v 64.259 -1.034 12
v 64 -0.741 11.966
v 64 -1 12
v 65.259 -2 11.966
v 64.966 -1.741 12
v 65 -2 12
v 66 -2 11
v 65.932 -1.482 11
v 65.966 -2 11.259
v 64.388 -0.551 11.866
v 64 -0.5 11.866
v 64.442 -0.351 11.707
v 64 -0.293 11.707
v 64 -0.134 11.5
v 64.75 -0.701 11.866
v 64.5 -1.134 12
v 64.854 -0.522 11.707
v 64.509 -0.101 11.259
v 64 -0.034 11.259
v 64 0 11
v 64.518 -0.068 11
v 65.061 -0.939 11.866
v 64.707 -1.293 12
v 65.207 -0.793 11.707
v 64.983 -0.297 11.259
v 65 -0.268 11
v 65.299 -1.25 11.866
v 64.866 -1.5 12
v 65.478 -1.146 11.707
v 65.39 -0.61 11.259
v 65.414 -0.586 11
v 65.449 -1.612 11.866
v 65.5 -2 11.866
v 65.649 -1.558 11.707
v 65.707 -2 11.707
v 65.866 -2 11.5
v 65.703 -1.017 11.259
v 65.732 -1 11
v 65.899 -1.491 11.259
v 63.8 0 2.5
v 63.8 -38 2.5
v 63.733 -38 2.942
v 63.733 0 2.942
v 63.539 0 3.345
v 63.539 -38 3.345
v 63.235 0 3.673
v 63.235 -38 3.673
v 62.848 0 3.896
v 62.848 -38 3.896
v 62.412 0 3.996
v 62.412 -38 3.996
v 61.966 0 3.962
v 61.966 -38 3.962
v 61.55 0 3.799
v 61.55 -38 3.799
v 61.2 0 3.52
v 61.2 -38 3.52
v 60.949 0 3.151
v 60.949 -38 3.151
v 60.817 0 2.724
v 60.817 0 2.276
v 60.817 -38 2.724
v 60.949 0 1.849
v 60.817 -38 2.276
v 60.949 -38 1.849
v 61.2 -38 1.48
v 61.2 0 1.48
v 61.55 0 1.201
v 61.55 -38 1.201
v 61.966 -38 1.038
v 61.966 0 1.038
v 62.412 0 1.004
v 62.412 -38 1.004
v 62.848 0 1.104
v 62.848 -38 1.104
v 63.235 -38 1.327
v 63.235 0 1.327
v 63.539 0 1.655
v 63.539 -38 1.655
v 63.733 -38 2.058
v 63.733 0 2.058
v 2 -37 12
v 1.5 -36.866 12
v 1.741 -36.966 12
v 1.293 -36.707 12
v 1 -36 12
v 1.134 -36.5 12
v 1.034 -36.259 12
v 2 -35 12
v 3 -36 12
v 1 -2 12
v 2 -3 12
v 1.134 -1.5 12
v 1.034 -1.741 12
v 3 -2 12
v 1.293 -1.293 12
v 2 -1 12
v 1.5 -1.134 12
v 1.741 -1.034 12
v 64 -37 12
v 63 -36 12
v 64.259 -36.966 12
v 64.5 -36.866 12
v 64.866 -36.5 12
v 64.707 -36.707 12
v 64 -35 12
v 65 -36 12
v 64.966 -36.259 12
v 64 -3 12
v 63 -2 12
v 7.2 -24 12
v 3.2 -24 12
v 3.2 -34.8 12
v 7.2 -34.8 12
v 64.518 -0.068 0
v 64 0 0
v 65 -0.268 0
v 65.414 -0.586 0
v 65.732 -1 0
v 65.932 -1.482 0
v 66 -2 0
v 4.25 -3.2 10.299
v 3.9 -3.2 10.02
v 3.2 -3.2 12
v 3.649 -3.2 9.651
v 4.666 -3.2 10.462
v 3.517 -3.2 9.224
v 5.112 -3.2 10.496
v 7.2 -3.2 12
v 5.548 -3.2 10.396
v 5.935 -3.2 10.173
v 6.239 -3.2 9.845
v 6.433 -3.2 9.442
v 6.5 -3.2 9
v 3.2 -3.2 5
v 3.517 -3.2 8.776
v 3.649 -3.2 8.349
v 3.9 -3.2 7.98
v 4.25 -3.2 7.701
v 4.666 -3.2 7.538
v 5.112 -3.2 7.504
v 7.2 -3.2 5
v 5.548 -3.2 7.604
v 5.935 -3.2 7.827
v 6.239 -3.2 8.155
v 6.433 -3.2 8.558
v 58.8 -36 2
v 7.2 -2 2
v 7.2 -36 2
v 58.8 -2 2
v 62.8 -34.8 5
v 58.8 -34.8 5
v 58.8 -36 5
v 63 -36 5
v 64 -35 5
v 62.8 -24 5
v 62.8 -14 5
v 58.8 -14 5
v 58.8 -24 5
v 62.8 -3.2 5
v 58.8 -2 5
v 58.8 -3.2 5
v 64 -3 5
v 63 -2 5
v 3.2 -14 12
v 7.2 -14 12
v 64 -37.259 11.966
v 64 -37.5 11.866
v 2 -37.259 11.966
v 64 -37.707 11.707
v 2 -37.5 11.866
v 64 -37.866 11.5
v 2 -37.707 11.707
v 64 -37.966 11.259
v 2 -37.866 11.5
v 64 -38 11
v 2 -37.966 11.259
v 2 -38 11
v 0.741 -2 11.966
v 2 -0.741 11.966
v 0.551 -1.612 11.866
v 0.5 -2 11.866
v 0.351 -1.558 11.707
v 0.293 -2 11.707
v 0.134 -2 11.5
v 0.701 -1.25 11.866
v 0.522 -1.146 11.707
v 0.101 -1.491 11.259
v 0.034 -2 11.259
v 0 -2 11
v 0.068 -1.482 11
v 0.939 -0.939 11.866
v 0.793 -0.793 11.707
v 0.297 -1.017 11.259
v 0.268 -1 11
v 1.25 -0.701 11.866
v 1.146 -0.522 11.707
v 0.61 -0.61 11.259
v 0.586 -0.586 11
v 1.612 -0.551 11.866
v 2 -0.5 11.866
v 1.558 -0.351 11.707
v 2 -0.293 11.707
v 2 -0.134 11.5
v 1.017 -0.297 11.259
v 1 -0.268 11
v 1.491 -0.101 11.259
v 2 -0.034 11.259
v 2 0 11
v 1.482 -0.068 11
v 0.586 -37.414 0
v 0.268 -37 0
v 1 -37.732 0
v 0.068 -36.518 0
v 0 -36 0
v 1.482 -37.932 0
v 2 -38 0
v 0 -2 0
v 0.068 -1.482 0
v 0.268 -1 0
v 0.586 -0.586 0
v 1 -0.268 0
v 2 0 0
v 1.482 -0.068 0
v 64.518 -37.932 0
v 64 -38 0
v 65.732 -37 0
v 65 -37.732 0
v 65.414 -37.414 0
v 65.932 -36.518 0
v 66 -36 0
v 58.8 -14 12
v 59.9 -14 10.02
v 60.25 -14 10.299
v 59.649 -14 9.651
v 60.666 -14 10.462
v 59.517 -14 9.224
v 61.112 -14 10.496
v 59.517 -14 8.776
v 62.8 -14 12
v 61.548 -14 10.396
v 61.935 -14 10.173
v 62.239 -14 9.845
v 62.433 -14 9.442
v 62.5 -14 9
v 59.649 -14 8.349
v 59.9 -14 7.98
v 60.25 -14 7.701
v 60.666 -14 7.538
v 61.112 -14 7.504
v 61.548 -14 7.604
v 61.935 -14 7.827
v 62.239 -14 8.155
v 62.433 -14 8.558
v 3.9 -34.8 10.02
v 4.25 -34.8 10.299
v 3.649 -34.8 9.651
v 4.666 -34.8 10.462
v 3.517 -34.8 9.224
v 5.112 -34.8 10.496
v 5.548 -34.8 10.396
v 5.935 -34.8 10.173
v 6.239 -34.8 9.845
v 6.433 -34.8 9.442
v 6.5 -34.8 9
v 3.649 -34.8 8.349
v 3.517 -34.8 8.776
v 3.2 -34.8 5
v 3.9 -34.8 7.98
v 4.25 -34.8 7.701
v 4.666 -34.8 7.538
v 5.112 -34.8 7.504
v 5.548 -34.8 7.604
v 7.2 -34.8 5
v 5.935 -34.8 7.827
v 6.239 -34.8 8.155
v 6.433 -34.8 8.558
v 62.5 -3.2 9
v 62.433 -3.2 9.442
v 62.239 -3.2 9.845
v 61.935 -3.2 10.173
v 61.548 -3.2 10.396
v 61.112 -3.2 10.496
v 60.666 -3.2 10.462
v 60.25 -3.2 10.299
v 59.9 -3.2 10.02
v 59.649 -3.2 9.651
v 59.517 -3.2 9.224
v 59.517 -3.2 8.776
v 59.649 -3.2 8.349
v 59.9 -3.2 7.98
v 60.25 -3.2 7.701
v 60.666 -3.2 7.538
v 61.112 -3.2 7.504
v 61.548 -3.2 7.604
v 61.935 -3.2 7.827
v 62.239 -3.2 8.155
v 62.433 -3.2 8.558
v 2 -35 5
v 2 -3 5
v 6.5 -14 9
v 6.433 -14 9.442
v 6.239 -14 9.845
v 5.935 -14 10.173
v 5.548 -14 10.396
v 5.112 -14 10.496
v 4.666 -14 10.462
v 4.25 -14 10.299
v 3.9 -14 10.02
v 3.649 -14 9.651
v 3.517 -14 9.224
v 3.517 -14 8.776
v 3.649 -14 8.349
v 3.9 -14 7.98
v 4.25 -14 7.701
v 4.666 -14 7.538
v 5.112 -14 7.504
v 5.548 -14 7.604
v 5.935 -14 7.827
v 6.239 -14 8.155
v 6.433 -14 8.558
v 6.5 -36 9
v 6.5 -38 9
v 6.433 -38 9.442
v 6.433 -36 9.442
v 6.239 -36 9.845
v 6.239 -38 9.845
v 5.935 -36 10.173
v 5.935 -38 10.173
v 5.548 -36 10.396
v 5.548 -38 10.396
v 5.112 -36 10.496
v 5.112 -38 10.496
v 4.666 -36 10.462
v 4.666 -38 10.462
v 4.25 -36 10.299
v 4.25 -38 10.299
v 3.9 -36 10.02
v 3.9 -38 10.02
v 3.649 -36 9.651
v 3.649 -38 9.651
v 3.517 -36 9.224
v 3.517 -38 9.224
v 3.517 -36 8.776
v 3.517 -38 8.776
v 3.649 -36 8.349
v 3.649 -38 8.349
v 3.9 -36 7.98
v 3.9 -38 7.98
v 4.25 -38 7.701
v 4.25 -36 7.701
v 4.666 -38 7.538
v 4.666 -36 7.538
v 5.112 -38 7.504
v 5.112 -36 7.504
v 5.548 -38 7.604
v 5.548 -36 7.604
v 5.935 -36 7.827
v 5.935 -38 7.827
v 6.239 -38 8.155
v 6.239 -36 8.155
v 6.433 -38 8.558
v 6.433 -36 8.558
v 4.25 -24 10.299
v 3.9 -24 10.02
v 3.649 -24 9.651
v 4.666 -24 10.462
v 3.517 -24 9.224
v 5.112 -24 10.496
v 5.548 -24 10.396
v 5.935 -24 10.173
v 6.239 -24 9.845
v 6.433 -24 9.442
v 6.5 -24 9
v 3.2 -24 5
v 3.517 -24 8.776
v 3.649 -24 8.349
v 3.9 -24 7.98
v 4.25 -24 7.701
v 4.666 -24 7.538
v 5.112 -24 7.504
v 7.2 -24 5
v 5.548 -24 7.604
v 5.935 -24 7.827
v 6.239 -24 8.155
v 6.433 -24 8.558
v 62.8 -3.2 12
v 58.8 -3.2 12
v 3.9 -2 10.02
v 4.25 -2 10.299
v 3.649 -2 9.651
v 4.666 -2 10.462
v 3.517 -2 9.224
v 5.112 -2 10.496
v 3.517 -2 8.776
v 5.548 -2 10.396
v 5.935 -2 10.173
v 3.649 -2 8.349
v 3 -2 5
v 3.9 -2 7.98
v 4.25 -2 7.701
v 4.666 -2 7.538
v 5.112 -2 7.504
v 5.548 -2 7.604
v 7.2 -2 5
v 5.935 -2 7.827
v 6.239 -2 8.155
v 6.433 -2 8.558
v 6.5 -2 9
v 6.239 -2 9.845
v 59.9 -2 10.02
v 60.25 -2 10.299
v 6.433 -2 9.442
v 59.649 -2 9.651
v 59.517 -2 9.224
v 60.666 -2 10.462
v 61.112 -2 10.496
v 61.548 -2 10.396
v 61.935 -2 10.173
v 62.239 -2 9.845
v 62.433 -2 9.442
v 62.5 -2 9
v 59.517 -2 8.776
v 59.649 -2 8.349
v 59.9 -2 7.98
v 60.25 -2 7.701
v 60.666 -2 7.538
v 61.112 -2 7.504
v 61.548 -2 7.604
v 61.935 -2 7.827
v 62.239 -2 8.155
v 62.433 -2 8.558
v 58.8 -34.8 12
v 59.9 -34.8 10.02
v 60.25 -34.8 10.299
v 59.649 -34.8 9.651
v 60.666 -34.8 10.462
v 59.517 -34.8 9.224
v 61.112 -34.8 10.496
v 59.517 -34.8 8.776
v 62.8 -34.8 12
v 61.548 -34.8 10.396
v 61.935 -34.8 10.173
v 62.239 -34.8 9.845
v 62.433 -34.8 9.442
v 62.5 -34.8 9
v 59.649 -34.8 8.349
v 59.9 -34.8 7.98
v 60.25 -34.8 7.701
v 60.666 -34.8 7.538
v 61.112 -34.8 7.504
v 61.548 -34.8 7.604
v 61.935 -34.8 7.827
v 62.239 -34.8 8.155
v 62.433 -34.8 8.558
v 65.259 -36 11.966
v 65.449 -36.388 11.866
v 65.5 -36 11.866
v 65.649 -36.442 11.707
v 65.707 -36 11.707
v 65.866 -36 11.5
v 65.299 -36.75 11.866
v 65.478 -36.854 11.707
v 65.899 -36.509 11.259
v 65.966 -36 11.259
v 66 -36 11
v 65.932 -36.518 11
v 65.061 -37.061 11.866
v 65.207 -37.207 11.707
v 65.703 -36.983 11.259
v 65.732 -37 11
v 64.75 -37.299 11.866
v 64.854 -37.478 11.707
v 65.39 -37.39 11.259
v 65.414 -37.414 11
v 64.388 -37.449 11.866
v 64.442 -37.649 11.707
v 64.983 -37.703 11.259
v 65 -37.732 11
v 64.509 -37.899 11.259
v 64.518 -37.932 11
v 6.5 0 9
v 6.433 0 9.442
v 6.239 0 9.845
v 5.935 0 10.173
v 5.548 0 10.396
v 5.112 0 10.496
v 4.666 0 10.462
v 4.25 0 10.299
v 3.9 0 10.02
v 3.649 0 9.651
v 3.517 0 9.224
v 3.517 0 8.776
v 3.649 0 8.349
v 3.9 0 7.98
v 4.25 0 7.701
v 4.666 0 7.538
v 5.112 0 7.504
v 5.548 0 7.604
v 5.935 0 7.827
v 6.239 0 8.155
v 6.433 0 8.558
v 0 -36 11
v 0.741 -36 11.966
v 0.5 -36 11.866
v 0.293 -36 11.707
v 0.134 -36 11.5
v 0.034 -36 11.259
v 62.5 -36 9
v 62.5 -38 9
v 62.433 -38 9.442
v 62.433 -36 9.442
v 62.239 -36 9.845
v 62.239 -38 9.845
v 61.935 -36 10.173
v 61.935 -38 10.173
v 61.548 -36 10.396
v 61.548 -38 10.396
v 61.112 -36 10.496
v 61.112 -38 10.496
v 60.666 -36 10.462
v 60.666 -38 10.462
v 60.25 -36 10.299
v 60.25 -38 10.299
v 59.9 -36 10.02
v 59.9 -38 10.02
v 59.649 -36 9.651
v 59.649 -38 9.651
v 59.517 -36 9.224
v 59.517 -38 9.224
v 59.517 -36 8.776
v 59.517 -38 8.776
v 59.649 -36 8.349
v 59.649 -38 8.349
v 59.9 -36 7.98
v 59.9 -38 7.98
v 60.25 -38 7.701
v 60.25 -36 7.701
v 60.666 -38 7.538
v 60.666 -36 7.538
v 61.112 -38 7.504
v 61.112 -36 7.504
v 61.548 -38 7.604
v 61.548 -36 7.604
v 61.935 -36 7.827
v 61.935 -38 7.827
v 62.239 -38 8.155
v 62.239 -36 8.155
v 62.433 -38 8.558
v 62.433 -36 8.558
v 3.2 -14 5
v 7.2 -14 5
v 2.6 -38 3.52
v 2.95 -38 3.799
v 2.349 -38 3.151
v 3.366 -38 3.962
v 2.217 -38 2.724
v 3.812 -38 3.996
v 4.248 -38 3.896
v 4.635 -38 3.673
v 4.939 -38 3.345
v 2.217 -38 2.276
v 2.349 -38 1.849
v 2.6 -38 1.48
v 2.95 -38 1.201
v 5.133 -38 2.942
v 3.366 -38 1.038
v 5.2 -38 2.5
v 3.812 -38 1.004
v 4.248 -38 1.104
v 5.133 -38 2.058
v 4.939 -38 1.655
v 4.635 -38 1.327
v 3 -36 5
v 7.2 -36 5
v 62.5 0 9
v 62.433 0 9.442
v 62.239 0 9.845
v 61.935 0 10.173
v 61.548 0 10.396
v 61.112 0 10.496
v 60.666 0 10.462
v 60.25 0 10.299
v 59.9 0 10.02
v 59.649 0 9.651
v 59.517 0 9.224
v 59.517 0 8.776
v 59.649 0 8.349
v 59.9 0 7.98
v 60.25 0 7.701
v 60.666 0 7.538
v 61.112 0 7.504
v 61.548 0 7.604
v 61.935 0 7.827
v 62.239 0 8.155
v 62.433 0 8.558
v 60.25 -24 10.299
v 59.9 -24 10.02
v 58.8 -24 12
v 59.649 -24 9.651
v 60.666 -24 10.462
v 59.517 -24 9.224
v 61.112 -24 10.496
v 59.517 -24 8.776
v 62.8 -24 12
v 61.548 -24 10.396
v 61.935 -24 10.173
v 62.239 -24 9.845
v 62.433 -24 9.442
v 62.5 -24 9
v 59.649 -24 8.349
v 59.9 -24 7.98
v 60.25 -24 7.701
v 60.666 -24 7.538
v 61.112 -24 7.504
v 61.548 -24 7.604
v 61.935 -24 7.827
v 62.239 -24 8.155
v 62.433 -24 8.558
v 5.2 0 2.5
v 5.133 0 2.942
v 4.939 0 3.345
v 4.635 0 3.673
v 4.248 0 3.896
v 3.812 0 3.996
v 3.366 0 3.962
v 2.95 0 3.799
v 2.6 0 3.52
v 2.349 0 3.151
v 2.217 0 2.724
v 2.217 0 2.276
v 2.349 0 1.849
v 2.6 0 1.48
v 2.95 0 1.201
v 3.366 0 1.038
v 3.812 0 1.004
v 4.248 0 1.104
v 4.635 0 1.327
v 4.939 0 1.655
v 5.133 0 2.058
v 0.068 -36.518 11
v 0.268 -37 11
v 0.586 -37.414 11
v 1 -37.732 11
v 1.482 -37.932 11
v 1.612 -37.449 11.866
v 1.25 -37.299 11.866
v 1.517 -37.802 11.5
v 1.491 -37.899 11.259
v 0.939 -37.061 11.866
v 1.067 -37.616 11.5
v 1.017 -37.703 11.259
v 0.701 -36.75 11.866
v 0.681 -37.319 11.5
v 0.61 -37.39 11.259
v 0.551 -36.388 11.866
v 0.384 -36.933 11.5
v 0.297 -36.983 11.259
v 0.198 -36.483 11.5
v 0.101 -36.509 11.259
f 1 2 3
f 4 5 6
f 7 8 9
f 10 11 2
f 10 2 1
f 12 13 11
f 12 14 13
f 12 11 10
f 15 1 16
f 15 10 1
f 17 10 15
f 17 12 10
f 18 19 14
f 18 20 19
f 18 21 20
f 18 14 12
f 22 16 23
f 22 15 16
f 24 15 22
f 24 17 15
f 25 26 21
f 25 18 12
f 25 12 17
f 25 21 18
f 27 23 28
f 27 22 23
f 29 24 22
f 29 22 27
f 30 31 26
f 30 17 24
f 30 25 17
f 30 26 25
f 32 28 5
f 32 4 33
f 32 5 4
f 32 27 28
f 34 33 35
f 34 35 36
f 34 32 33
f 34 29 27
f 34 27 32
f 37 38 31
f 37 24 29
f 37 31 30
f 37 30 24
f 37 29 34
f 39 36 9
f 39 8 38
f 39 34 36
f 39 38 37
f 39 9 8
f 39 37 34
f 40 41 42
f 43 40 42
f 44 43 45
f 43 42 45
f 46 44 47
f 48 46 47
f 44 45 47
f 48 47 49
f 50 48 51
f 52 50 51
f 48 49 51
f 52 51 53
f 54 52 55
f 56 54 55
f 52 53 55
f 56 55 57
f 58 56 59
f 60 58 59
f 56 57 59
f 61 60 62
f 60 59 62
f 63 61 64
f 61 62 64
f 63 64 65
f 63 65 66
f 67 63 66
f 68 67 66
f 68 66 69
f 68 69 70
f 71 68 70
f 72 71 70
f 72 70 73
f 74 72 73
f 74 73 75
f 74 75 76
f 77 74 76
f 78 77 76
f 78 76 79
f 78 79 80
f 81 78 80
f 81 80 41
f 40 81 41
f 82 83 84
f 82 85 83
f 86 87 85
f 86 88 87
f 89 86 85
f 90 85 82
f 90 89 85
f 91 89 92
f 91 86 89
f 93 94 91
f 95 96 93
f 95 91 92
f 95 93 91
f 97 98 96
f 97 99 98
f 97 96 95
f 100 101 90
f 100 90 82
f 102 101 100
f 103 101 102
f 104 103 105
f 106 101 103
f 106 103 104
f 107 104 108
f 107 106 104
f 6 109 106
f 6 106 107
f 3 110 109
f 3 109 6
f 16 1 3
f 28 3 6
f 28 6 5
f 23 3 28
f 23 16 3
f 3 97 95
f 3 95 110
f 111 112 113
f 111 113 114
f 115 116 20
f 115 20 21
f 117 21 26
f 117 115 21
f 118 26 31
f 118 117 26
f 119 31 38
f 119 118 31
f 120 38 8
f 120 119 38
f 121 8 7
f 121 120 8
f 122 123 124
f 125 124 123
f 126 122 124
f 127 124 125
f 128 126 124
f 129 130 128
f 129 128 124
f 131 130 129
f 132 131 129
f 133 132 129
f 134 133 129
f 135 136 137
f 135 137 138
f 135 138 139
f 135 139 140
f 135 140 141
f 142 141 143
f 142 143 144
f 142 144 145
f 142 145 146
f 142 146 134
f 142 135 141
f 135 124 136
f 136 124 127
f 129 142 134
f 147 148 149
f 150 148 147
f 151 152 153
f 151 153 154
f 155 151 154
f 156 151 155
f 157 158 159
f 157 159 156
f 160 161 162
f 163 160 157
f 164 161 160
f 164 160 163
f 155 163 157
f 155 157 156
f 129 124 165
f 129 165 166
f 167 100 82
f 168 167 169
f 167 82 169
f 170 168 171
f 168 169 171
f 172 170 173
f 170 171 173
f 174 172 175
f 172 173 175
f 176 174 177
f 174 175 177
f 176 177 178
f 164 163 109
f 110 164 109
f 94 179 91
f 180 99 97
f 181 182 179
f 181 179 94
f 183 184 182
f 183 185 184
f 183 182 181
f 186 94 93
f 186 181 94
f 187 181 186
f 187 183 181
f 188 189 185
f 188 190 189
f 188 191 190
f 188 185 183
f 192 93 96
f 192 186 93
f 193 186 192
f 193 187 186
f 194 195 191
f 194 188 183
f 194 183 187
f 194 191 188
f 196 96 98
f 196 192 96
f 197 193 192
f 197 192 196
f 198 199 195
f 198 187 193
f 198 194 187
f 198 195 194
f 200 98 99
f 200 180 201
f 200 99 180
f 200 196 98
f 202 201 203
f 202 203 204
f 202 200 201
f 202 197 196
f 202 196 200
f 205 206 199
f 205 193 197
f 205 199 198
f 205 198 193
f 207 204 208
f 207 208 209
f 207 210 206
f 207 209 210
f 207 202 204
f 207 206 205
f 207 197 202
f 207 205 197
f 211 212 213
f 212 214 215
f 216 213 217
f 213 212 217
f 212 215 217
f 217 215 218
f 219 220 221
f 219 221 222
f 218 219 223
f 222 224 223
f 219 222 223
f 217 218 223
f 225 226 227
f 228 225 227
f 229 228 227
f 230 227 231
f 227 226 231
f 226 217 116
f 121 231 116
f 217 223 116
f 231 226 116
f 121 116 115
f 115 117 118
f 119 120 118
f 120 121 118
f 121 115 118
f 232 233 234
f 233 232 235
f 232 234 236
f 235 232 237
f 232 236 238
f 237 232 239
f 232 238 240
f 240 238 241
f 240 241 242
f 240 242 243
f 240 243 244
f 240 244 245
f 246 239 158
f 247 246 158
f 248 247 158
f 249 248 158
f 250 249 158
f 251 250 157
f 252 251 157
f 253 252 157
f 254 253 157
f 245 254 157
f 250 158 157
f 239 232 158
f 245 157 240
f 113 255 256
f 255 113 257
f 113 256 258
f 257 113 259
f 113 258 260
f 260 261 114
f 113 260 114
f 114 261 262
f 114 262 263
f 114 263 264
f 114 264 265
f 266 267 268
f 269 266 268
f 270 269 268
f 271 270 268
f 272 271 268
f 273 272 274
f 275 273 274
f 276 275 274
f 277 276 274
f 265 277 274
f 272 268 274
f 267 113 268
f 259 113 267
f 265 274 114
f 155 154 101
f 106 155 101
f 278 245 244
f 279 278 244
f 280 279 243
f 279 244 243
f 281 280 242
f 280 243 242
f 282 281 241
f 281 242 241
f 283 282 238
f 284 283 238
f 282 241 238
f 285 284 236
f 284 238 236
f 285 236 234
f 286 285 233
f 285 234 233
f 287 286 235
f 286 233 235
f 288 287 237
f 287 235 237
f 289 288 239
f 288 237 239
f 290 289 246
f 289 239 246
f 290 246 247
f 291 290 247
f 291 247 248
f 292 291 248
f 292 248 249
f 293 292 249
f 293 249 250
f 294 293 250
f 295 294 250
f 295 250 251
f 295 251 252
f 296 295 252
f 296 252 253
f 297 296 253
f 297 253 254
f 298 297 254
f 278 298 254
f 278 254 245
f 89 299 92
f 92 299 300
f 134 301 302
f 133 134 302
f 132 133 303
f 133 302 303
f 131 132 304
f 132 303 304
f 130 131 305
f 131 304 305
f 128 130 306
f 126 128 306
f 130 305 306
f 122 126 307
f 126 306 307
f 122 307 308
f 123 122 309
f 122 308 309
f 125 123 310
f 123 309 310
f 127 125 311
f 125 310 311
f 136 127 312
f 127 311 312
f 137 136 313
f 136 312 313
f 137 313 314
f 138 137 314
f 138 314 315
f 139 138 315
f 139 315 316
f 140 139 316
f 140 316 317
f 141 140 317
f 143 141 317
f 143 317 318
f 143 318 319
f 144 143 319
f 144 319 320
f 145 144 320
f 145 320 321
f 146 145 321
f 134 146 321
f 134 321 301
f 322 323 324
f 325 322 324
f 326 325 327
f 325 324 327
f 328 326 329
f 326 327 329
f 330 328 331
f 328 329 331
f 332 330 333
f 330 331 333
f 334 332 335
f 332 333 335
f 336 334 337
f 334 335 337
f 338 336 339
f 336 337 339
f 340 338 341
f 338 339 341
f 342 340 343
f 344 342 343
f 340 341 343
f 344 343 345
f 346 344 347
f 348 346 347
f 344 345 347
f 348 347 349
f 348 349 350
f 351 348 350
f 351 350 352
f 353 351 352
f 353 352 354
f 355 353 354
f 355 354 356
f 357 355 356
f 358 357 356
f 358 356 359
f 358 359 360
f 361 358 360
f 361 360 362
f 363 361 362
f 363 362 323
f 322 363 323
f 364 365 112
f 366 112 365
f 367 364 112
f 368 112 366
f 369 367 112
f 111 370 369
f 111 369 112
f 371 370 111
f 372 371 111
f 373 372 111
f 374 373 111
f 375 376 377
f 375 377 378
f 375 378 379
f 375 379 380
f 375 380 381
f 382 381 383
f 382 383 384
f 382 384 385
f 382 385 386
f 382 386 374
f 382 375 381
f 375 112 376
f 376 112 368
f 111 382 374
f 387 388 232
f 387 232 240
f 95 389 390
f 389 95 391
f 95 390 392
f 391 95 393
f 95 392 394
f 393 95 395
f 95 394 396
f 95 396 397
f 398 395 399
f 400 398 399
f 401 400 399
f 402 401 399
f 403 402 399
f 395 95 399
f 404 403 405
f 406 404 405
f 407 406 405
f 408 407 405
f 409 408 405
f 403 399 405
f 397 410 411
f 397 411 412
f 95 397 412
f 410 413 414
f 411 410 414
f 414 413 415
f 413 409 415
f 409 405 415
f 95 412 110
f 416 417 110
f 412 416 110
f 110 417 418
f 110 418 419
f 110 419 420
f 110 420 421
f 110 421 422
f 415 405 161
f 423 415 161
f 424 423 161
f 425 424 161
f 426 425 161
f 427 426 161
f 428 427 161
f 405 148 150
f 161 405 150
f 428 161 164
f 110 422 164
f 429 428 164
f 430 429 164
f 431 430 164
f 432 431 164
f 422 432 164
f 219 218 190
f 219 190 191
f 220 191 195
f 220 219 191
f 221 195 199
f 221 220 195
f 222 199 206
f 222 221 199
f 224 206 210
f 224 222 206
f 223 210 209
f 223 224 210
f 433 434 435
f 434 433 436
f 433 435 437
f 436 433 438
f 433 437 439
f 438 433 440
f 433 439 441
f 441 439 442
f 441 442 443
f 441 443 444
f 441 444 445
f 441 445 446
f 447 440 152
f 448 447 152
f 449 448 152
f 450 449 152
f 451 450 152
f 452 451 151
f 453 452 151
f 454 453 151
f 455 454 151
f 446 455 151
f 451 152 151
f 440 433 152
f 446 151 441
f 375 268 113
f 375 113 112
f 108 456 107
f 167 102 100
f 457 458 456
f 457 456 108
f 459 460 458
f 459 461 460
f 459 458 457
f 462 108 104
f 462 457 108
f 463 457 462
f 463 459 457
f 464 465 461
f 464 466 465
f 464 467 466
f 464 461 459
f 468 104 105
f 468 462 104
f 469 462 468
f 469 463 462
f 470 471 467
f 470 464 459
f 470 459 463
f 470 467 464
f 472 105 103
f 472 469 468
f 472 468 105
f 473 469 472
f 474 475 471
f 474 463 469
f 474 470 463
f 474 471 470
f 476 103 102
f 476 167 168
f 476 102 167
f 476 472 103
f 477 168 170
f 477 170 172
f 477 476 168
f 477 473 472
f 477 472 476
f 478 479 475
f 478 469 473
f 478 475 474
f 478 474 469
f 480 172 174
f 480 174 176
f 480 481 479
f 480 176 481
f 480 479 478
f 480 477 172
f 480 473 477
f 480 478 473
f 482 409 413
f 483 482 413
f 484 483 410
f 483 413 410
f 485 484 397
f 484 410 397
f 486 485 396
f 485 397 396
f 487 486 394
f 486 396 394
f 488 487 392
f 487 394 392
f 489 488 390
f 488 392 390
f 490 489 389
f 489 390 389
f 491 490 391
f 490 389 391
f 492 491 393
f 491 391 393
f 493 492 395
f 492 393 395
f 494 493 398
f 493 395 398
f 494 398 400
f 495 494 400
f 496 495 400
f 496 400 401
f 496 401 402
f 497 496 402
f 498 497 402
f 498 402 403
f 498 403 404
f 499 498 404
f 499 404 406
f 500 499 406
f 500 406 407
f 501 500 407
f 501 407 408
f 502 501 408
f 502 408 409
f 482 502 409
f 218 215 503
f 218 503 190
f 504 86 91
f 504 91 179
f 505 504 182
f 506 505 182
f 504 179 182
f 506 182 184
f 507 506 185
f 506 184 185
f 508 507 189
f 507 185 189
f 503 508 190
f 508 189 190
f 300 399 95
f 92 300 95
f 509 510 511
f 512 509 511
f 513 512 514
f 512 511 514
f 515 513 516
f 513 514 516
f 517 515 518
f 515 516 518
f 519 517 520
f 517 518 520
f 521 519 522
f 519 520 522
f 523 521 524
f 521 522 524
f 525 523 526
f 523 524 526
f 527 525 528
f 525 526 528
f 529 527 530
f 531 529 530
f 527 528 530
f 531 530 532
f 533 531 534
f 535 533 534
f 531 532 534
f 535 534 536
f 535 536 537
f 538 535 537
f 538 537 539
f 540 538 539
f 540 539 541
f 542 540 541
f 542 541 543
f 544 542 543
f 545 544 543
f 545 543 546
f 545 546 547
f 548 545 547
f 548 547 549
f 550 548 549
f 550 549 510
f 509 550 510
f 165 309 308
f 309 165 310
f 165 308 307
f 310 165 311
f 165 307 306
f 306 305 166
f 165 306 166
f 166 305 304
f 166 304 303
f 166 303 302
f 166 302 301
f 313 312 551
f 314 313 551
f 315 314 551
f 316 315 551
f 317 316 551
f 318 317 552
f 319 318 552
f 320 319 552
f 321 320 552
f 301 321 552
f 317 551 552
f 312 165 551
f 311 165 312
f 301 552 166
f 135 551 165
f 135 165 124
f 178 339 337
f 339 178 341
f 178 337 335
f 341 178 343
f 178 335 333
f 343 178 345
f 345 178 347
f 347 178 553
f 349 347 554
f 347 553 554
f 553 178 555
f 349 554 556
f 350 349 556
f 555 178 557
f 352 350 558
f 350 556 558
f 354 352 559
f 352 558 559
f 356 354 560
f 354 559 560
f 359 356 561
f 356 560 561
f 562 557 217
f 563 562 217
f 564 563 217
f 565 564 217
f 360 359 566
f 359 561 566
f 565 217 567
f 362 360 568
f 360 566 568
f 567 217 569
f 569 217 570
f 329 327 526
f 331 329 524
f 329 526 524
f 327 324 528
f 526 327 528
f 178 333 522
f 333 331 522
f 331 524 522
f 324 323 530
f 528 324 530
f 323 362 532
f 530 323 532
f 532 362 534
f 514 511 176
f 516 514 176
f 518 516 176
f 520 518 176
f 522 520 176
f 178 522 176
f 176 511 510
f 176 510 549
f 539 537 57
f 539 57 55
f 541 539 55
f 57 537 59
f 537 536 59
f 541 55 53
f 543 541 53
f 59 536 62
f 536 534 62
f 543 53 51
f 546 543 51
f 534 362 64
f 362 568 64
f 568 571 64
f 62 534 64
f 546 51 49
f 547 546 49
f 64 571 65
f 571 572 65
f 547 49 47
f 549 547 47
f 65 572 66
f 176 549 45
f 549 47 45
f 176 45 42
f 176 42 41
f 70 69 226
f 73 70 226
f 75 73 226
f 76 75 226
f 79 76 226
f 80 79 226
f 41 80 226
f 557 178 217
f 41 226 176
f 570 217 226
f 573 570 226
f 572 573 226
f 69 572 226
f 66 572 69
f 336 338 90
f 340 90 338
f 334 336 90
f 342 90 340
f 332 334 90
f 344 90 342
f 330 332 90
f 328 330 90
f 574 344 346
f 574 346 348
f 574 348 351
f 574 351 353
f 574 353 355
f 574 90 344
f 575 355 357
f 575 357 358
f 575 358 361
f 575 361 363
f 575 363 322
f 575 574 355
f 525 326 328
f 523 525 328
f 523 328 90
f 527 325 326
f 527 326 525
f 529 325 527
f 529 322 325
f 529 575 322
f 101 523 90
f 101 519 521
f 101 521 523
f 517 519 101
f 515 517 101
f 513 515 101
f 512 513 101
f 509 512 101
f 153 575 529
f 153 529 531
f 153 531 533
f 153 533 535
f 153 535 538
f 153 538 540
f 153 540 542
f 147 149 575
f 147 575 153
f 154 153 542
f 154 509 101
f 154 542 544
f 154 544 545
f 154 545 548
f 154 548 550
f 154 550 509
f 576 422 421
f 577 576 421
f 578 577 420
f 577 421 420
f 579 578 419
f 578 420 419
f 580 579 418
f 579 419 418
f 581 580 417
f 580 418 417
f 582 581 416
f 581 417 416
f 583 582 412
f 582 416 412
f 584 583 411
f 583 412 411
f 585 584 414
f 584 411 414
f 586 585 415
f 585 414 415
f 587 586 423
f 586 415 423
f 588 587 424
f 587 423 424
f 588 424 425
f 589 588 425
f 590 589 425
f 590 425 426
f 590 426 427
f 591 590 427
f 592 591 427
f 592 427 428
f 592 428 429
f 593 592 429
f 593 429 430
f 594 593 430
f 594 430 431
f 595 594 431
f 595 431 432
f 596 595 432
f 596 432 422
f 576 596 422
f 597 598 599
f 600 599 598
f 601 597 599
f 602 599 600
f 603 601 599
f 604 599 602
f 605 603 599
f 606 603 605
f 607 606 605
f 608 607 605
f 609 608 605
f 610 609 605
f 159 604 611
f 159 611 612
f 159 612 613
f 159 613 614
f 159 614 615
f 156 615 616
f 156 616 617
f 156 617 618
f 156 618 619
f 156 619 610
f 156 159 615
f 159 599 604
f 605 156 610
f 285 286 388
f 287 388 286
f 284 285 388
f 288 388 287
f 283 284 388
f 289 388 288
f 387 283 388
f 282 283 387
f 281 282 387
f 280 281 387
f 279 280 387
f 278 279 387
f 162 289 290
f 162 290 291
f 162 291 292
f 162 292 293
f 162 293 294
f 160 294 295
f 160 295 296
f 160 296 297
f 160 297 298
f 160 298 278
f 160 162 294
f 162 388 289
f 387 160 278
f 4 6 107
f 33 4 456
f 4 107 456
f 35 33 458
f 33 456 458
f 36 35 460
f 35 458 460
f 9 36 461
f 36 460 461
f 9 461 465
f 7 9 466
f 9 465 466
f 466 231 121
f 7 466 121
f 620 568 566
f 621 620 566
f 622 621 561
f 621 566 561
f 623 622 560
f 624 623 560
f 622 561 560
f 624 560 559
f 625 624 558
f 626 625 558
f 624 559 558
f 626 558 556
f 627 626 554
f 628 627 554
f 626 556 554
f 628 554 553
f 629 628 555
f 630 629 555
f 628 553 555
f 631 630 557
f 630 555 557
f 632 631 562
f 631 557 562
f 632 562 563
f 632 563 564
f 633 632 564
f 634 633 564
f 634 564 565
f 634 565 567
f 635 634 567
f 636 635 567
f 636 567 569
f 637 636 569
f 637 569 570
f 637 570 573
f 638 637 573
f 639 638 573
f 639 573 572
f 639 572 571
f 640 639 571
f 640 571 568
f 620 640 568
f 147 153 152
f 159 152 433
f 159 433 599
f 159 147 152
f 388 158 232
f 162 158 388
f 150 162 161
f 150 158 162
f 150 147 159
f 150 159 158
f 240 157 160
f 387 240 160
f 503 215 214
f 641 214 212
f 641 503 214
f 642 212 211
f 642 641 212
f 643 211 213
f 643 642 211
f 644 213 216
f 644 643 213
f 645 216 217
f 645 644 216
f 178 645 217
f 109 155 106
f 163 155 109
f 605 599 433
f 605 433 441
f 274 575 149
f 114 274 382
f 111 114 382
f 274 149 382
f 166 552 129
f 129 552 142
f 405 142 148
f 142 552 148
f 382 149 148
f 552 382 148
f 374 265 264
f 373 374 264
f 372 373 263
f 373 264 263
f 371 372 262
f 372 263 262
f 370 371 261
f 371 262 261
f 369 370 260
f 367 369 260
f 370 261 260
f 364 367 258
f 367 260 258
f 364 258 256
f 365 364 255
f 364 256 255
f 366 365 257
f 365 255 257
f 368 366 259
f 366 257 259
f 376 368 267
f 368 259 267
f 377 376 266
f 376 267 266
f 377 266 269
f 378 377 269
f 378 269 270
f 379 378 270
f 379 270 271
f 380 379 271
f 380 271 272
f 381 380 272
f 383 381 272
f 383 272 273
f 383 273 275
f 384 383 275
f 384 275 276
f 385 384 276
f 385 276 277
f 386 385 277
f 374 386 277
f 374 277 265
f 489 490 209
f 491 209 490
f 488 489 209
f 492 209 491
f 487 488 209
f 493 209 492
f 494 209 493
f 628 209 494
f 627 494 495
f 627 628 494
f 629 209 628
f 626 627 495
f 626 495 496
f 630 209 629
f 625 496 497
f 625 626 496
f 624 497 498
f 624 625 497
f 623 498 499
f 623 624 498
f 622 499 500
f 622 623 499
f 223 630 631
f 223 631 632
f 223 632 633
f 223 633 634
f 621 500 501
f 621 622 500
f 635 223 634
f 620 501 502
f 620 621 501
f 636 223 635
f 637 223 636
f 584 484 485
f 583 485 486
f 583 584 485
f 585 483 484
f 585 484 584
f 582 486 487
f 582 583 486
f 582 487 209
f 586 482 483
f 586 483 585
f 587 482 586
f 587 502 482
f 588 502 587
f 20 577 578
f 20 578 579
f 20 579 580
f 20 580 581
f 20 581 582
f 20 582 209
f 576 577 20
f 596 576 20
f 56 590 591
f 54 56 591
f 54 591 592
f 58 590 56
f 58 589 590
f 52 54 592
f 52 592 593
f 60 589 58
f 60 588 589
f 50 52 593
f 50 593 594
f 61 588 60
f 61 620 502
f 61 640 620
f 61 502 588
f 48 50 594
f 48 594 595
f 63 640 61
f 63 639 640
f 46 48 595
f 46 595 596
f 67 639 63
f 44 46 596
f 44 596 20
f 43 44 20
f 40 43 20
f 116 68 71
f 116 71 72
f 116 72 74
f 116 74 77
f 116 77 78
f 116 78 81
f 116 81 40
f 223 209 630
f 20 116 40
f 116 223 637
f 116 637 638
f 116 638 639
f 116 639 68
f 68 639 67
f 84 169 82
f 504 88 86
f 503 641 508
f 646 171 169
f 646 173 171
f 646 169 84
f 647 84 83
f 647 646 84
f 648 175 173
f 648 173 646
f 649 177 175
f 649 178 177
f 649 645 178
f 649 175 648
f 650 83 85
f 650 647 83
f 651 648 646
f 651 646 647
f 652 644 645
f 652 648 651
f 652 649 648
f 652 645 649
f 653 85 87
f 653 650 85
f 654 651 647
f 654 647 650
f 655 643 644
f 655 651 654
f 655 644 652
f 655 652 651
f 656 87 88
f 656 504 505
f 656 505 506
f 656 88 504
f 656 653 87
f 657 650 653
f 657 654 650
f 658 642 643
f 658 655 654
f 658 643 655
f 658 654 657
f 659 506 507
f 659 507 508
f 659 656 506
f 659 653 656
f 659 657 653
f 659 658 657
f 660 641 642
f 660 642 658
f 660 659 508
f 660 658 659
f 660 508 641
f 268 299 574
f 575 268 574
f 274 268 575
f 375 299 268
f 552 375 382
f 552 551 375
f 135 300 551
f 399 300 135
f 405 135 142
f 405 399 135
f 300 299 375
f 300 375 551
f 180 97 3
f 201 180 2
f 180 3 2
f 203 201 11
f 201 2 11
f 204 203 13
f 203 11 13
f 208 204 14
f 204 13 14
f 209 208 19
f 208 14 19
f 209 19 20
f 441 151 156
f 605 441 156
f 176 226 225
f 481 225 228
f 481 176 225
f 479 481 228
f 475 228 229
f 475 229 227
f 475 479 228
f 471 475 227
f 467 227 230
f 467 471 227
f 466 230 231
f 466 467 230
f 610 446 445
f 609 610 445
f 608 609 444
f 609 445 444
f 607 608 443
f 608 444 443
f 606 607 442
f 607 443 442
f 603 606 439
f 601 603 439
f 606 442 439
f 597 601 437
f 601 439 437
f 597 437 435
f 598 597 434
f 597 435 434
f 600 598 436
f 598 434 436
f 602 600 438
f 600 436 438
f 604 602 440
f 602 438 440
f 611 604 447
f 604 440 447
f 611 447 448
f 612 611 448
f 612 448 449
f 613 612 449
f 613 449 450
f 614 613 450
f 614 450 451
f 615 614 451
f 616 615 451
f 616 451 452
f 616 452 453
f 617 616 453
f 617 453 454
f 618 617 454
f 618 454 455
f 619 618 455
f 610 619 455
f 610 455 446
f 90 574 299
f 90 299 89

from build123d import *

# Parameters (mm, degrees)
F0_W      = 66
F0_H      = 38
F1_DEPTH  = 2
F2_W      = 66
F2_H      = 38
F2_W_2    = 62
F2_H_2    = 34
F3_DEPTH  = 10
F4_SIZE   = 1
F5_R      = 2
F6_R      = 1
F7_W      = 5.2
F7_H      = 34
F8_DEPTH  = 3
F9_R      = 1.5
F10_DEPTH = 38.001
F11_W     = 4
F11_H     = 10.8
F12_DEPTH = 7
F13_R     = 1.5
F14_DEPTH = 38.001


with BuildPart() as f1:
    # F0 (on Top) → F1 (new body)
    with BuildSketch(Plane.XY):
        with Locations((33, -19)):
            Rectangle(F0_W, F0_H)
    extrude(amount=F1_DEPTH)

    # F2 (on face) → F3 (join)
    with BuildSketch(Plane.XY.offset(2)):
        with Locations((33, -19)):
            Rectangle(F2_W, F2_H)
        with Locations((33, -19)):
            Rectangle(F2_W_2, F2_H_2, mode=Mode.SUBTRACT)
    extrude(amount=F3_DEPTH)

    # F4
    f4_edges = [f1.edges().sort_by_distance(p)[0] for p in [
        (2, -2, 7),
        (2, -36, 7),
        (64, -2, 7),
        (64, -36, 7),
    ]]
    chamfer(f4_edges, length=F4_SIZE)

    # F5
    f5_edges = [f1.edges().sort_by_distance(p)[0] for p in [
        (0, -38, 6),
        (66, -38, 6),
        (66, 0, 6),
        (0, 0, 6),
    ]]
    fillet(f5_edges, radius=F5_R)

    # F6
    f6_edges = [f1.edges().sort_by_distance(p)[0] for p in [
        (0, -19, 12),
        (33, -38, 12),
        (66, -19, 12),
        (33, 0, 12),
    ]]
    fillet(f6_edges, radius=F6_R)

    # F7 (on face) → F8 (join)
    with BuildSketch(Plane.XY.offset(2)):
        with Locations((4.6, -19)):
            Rectangle(F7_W, F7_H)
        with Locations((61.4, -19)):
            Rectangle(F7_W, F7_H)
    extrude(amount=F8_DEPTH)

    # F9 (on face) → F10 (cut, through all)
    with BuildSketch(Plane.XZ.offset(38)):
        with Locations((3.7, 2.5)):
            Circle(F9_R)
        with Locations((62.3, 2.5)):
            Circle(F9_R)
    extrude(amount=-F10_DEPTH, mode=Mode.SUBTRACT)

    # F11 (on face) → F12 (join)
    with BuildSketch(Plane.XY.offset(5)):
        with Locations((5.2, -8.6)):
            Rectangle(F11_W, F11_H)
        with Locations((5.2, -29.4)):
            Rectangle(F11_W, F11_H)
        with Locations((60.8, -8.6)):
            Rectangle(F11_W, F11_H)
        with Locations((60.8, -29.4)):
            Rectangle(F11_W, F11_H)
    extrude(amount=F12_DEPTH)

    # F13 (on face) → F14 (cut, through all)
    with BuildSketch(Plane.XZ.offset(38)):
        with Locations((5, 9)):
            Circle(F13_R)
        with Locations((61, 9)):
            Circle(F13_R)
    extrude(amount=-F14_DEPTH, mode=Mode.SUBTRACT)


solid = f1.part
